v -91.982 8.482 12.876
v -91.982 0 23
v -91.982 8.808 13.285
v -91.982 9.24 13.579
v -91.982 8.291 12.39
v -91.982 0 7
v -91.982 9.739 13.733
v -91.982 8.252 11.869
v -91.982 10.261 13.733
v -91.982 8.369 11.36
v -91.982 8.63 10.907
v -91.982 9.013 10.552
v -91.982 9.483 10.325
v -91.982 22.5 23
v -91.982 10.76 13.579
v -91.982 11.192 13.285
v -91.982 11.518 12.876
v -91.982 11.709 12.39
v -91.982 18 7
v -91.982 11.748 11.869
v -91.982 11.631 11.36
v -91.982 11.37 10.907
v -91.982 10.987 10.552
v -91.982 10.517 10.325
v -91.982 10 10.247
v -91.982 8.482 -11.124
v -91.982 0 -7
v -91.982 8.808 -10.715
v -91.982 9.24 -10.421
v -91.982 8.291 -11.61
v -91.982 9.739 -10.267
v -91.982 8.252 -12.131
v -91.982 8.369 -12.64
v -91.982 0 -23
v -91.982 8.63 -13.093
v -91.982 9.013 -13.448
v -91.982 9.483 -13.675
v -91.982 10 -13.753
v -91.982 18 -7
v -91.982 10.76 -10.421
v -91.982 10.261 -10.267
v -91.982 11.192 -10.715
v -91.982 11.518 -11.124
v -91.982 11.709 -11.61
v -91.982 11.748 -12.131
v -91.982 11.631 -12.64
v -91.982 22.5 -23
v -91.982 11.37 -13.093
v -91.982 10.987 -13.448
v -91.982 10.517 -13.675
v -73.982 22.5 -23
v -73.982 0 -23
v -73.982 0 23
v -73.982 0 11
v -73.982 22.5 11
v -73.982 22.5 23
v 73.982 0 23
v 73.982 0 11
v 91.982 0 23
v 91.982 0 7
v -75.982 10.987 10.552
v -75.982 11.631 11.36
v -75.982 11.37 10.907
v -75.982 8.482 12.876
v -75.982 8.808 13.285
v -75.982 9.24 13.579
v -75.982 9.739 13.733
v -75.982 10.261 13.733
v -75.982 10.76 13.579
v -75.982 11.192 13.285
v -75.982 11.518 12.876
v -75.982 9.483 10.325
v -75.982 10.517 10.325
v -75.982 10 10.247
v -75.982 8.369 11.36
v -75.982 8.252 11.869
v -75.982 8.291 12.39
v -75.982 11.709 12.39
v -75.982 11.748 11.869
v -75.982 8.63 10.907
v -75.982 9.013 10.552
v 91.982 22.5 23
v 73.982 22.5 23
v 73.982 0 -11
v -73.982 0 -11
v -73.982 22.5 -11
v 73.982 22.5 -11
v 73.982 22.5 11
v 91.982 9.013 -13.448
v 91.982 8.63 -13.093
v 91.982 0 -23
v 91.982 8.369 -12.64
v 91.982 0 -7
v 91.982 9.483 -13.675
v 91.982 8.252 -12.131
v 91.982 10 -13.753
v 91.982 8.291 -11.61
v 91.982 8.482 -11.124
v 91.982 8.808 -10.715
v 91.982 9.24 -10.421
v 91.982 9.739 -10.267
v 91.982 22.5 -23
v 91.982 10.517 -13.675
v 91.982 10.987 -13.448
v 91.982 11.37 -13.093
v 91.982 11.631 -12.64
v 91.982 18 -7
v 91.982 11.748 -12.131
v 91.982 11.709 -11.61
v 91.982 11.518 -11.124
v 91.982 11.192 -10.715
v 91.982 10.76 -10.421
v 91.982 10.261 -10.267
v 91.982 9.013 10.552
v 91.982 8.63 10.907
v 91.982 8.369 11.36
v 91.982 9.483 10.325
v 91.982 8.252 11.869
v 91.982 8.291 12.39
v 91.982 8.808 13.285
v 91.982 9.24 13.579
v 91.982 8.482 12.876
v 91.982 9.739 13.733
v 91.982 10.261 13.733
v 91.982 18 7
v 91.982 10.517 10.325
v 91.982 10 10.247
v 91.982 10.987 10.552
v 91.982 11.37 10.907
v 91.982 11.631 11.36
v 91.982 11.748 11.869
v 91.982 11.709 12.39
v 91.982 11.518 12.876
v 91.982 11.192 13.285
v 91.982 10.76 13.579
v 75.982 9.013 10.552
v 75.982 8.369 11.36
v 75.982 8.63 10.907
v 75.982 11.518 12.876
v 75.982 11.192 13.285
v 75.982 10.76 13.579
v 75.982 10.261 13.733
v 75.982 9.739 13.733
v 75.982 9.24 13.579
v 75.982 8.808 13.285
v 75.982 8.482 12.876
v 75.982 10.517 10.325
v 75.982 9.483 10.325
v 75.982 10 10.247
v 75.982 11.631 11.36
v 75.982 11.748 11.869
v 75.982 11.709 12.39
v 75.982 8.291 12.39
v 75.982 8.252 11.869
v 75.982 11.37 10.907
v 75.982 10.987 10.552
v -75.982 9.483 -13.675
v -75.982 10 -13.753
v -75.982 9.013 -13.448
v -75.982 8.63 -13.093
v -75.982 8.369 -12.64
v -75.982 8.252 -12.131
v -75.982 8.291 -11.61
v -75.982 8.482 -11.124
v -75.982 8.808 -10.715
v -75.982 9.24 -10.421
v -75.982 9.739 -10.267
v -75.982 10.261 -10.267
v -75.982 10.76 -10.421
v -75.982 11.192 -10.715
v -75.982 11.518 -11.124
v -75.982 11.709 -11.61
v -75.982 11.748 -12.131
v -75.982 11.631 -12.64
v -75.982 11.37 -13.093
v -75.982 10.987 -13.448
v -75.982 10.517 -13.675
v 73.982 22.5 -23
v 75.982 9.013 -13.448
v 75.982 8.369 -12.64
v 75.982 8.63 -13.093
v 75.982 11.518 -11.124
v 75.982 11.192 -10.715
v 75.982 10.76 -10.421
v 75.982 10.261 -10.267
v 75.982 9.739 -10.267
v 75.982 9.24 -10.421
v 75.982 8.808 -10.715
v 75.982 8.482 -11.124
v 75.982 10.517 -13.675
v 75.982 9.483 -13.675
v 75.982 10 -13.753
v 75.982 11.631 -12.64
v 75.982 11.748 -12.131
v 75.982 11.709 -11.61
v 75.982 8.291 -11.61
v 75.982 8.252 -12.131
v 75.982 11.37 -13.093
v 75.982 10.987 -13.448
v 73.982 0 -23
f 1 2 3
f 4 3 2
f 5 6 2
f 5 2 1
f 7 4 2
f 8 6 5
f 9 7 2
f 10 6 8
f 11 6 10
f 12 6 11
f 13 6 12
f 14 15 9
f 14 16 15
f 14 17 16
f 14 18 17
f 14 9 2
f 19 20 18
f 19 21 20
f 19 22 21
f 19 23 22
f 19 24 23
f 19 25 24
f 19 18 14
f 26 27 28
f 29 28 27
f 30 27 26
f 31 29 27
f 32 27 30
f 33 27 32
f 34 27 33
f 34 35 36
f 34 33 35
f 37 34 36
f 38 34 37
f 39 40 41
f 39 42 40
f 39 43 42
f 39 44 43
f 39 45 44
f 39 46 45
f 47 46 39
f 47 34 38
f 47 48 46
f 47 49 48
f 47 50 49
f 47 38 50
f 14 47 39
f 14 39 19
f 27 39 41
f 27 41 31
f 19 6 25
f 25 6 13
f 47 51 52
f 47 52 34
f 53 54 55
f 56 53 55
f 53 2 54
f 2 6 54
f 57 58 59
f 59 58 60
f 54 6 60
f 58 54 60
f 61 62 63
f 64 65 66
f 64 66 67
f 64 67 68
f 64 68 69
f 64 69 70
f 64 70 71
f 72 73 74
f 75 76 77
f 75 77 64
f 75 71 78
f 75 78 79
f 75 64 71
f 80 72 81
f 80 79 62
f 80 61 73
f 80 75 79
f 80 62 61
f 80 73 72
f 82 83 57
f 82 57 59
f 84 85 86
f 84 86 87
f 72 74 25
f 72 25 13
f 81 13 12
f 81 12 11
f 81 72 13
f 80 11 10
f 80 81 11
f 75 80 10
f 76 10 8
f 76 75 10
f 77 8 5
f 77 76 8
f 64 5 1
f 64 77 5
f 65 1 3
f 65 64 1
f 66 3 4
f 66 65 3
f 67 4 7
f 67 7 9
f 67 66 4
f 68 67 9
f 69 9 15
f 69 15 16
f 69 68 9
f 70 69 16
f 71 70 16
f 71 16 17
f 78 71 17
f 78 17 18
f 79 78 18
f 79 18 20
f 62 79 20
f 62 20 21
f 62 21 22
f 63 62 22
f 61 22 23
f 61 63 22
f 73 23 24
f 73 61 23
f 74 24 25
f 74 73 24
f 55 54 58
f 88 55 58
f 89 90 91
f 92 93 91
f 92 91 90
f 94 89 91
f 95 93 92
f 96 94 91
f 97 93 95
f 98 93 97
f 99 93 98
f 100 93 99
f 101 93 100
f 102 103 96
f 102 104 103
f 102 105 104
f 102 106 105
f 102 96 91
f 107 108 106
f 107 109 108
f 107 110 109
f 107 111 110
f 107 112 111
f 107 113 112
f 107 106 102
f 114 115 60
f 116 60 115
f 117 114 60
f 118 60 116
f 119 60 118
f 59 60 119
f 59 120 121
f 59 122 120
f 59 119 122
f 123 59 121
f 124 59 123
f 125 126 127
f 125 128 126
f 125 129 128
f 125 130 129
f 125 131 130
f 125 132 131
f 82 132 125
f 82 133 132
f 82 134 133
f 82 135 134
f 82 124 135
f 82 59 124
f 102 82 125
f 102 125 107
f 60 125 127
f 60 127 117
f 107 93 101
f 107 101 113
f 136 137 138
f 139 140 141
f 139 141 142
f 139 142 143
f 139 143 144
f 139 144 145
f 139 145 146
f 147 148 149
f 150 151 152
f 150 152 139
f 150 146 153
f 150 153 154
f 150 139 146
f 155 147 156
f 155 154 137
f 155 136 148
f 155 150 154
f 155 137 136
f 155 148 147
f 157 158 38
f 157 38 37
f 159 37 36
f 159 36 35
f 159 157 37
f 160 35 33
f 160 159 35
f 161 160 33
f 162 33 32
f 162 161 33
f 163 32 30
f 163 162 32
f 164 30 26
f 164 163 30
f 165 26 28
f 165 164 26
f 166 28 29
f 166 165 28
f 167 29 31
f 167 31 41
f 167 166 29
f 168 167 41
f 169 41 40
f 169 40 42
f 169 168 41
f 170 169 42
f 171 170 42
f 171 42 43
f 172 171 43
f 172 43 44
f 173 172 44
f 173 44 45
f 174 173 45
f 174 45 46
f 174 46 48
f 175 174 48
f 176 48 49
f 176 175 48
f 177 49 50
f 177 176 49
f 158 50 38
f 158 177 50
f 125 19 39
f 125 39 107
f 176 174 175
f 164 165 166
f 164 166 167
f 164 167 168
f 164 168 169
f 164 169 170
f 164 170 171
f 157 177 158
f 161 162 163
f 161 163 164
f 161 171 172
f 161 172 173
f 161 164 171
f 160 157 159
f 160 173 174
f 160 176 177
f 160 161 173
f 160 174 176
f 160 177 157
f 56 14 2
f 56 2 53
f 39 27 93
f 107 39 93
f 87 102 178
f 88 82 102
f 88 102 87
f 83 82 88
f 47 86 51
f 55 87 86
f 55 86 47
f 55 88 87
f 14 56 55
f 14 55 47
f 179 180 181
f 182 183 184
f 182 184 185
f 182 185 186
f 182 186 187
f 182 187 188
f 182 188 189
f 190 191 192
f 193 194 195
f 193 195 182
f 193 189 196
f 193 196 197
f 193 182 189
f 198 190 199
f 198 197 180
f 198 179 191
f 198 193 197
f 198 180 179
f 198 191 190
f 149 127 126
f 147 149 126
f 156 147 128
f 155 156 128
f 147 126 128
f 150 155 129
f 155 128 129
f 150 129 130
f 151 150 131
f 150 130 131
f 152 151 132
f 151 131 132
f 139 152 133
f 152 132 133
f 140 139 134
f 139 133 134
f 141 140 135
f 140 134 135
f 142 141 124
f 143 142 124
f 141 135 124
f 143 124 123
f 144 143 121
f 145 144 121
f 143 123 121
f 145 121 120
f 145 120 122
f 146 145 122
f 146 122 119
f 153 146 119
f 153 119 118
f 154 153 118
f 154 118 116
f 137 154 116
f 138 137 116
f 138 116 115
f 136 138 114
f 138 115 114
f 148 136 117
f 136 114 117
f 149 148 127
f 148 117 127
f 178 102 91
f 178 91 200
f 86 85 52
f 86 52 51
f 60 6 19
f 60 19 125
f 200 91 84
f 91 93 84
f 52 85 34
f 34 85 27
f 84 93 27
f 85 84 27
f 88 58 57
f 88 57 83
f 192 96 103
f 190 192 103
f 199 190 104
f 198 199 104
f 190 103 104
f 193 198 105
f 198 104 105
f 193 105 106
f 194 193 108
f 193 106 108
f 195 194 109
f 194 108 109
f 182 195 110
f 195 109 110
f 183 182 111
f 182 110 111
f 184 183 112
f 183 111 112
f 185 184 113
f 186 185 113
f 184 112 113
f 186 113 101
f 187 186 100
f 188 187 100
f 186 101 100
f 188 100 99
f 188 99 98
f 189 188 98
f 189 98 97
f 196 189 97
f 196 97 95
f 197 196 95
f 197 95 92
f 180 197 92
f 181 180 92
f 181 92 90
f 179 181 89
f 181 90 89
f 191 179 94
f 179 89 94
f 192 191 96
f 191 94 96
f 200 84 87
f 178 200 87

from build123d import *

# Parameters (mm, degrees)
SKETCH1_W           = 183.96444
SKETCH1_H           = 22
BOSS_EXTRUDE1_DEPTH = 22.5
SKETCH2_W           = 183.96444
SKETCH2_H           = 14
CUT_EXTRUDE1_DEPTH  = 18
SKETCH3_W           = 18
SKETCH3_H           = 22.5
BOSS_EXTRUDE2_DEPTH = 12
SKETCH4_W           = 18
SKETCH4_H           = 22.5
BOSS_EXTRUDE3_DEPTH = 12
SKETCH5_R           = 1.7526
CUT_EXTRUDE2_DEPTH  = 16
CUT_EXTRUDE3_START  = -16
SKETCH6_R           = 1.7526
CUT_EXTRUDE3_DEPTH  = 16


with BuildPart() as part:
    # Sketch1 → Boss-Extrude1 (new body)
    with BuildSketch(Plane(origin=(0, 0, 0), x_dir=(1, 0, 0), z_dir=(0, 1, 0))):
        Rectangle(SKETCH1_W, SKETCH1_H)
    extrude(amount=BOSS_EXTRUDE1_DEPTH)

    # Sketch2 → Cut-Extrude1 (cut)
    with BuildSketch(Plane.XZ):
        Rectangle(SKETCH2_W, SKETCH2_H)
    extrude(amount=-CUT_EXTRUDE1_DEPTH, mode=Mode.SUBTRACT)

    # Sketch3 → Boss-Extrude2 (add)
    with BuildSketch(Plane.XY.offset(11)):
        with Locations((-82.98222, 11.25)):
            Rectangle(SKETCH3_W, SKETCH3_H)
        with Locations((82.98222, 11.25)):
            Rectangle(SKETCH3_W, SKETCH3_H)
    extrude(amount=BOSS_EXTRUDE2_DEPTH)

    # Sketch4 → Boss-Extrude3 (add)
    with BuildSketch(Plane(origin=(0, 0, -11), x_dir=(-1, 0, 0), z_dir=(0, 0, -1))):
        with Locations((-82.98222, 11.25)):
            Rectangle(SKETCH4_W, SKETCH4_H)
        with Locations((82.98222, 11.25)):
            Rectangle(SKETCH4_W, SKETCH4_H)
    extrude(amount=BOSS_EXTRUDE3_DEPTH)

    # Sketch5 → Cut-Extrude2 (cut)
    with BuildSketch(Plane(origin=(91.98222, 0, 0), x_dir=(0, 0, -1), z_dir=(1, 0, 0))):
        with Locations((-12, 10)):
            Circle(SKETCH5_R)
        with Locations((12, 10)):
            Circle(SKETCH5_R)
    extrude(amount=-CUT_EXTRUDE2_DEPTH, mode=Mode.SUBTRACT)

    # Sketch6 → Cut-Extrude3 (cut)
    with BuildSketch(Plane.ZY.offset(91.98222).offset(CUT_EXTRUDE3_START)):
        with Locations(Location((-12, 10, 0), (0, 0, 180))):
            Circle(SKETCH6_R)
        with Locations(Location((12, 10, 0), (0, 0, 180))):
            Circle(SKETCH6_R)
    extrude(amount=CUT_EXTRUDE3_DEPTH, mode=Mode.SUBTRACT)


solid = part.part
